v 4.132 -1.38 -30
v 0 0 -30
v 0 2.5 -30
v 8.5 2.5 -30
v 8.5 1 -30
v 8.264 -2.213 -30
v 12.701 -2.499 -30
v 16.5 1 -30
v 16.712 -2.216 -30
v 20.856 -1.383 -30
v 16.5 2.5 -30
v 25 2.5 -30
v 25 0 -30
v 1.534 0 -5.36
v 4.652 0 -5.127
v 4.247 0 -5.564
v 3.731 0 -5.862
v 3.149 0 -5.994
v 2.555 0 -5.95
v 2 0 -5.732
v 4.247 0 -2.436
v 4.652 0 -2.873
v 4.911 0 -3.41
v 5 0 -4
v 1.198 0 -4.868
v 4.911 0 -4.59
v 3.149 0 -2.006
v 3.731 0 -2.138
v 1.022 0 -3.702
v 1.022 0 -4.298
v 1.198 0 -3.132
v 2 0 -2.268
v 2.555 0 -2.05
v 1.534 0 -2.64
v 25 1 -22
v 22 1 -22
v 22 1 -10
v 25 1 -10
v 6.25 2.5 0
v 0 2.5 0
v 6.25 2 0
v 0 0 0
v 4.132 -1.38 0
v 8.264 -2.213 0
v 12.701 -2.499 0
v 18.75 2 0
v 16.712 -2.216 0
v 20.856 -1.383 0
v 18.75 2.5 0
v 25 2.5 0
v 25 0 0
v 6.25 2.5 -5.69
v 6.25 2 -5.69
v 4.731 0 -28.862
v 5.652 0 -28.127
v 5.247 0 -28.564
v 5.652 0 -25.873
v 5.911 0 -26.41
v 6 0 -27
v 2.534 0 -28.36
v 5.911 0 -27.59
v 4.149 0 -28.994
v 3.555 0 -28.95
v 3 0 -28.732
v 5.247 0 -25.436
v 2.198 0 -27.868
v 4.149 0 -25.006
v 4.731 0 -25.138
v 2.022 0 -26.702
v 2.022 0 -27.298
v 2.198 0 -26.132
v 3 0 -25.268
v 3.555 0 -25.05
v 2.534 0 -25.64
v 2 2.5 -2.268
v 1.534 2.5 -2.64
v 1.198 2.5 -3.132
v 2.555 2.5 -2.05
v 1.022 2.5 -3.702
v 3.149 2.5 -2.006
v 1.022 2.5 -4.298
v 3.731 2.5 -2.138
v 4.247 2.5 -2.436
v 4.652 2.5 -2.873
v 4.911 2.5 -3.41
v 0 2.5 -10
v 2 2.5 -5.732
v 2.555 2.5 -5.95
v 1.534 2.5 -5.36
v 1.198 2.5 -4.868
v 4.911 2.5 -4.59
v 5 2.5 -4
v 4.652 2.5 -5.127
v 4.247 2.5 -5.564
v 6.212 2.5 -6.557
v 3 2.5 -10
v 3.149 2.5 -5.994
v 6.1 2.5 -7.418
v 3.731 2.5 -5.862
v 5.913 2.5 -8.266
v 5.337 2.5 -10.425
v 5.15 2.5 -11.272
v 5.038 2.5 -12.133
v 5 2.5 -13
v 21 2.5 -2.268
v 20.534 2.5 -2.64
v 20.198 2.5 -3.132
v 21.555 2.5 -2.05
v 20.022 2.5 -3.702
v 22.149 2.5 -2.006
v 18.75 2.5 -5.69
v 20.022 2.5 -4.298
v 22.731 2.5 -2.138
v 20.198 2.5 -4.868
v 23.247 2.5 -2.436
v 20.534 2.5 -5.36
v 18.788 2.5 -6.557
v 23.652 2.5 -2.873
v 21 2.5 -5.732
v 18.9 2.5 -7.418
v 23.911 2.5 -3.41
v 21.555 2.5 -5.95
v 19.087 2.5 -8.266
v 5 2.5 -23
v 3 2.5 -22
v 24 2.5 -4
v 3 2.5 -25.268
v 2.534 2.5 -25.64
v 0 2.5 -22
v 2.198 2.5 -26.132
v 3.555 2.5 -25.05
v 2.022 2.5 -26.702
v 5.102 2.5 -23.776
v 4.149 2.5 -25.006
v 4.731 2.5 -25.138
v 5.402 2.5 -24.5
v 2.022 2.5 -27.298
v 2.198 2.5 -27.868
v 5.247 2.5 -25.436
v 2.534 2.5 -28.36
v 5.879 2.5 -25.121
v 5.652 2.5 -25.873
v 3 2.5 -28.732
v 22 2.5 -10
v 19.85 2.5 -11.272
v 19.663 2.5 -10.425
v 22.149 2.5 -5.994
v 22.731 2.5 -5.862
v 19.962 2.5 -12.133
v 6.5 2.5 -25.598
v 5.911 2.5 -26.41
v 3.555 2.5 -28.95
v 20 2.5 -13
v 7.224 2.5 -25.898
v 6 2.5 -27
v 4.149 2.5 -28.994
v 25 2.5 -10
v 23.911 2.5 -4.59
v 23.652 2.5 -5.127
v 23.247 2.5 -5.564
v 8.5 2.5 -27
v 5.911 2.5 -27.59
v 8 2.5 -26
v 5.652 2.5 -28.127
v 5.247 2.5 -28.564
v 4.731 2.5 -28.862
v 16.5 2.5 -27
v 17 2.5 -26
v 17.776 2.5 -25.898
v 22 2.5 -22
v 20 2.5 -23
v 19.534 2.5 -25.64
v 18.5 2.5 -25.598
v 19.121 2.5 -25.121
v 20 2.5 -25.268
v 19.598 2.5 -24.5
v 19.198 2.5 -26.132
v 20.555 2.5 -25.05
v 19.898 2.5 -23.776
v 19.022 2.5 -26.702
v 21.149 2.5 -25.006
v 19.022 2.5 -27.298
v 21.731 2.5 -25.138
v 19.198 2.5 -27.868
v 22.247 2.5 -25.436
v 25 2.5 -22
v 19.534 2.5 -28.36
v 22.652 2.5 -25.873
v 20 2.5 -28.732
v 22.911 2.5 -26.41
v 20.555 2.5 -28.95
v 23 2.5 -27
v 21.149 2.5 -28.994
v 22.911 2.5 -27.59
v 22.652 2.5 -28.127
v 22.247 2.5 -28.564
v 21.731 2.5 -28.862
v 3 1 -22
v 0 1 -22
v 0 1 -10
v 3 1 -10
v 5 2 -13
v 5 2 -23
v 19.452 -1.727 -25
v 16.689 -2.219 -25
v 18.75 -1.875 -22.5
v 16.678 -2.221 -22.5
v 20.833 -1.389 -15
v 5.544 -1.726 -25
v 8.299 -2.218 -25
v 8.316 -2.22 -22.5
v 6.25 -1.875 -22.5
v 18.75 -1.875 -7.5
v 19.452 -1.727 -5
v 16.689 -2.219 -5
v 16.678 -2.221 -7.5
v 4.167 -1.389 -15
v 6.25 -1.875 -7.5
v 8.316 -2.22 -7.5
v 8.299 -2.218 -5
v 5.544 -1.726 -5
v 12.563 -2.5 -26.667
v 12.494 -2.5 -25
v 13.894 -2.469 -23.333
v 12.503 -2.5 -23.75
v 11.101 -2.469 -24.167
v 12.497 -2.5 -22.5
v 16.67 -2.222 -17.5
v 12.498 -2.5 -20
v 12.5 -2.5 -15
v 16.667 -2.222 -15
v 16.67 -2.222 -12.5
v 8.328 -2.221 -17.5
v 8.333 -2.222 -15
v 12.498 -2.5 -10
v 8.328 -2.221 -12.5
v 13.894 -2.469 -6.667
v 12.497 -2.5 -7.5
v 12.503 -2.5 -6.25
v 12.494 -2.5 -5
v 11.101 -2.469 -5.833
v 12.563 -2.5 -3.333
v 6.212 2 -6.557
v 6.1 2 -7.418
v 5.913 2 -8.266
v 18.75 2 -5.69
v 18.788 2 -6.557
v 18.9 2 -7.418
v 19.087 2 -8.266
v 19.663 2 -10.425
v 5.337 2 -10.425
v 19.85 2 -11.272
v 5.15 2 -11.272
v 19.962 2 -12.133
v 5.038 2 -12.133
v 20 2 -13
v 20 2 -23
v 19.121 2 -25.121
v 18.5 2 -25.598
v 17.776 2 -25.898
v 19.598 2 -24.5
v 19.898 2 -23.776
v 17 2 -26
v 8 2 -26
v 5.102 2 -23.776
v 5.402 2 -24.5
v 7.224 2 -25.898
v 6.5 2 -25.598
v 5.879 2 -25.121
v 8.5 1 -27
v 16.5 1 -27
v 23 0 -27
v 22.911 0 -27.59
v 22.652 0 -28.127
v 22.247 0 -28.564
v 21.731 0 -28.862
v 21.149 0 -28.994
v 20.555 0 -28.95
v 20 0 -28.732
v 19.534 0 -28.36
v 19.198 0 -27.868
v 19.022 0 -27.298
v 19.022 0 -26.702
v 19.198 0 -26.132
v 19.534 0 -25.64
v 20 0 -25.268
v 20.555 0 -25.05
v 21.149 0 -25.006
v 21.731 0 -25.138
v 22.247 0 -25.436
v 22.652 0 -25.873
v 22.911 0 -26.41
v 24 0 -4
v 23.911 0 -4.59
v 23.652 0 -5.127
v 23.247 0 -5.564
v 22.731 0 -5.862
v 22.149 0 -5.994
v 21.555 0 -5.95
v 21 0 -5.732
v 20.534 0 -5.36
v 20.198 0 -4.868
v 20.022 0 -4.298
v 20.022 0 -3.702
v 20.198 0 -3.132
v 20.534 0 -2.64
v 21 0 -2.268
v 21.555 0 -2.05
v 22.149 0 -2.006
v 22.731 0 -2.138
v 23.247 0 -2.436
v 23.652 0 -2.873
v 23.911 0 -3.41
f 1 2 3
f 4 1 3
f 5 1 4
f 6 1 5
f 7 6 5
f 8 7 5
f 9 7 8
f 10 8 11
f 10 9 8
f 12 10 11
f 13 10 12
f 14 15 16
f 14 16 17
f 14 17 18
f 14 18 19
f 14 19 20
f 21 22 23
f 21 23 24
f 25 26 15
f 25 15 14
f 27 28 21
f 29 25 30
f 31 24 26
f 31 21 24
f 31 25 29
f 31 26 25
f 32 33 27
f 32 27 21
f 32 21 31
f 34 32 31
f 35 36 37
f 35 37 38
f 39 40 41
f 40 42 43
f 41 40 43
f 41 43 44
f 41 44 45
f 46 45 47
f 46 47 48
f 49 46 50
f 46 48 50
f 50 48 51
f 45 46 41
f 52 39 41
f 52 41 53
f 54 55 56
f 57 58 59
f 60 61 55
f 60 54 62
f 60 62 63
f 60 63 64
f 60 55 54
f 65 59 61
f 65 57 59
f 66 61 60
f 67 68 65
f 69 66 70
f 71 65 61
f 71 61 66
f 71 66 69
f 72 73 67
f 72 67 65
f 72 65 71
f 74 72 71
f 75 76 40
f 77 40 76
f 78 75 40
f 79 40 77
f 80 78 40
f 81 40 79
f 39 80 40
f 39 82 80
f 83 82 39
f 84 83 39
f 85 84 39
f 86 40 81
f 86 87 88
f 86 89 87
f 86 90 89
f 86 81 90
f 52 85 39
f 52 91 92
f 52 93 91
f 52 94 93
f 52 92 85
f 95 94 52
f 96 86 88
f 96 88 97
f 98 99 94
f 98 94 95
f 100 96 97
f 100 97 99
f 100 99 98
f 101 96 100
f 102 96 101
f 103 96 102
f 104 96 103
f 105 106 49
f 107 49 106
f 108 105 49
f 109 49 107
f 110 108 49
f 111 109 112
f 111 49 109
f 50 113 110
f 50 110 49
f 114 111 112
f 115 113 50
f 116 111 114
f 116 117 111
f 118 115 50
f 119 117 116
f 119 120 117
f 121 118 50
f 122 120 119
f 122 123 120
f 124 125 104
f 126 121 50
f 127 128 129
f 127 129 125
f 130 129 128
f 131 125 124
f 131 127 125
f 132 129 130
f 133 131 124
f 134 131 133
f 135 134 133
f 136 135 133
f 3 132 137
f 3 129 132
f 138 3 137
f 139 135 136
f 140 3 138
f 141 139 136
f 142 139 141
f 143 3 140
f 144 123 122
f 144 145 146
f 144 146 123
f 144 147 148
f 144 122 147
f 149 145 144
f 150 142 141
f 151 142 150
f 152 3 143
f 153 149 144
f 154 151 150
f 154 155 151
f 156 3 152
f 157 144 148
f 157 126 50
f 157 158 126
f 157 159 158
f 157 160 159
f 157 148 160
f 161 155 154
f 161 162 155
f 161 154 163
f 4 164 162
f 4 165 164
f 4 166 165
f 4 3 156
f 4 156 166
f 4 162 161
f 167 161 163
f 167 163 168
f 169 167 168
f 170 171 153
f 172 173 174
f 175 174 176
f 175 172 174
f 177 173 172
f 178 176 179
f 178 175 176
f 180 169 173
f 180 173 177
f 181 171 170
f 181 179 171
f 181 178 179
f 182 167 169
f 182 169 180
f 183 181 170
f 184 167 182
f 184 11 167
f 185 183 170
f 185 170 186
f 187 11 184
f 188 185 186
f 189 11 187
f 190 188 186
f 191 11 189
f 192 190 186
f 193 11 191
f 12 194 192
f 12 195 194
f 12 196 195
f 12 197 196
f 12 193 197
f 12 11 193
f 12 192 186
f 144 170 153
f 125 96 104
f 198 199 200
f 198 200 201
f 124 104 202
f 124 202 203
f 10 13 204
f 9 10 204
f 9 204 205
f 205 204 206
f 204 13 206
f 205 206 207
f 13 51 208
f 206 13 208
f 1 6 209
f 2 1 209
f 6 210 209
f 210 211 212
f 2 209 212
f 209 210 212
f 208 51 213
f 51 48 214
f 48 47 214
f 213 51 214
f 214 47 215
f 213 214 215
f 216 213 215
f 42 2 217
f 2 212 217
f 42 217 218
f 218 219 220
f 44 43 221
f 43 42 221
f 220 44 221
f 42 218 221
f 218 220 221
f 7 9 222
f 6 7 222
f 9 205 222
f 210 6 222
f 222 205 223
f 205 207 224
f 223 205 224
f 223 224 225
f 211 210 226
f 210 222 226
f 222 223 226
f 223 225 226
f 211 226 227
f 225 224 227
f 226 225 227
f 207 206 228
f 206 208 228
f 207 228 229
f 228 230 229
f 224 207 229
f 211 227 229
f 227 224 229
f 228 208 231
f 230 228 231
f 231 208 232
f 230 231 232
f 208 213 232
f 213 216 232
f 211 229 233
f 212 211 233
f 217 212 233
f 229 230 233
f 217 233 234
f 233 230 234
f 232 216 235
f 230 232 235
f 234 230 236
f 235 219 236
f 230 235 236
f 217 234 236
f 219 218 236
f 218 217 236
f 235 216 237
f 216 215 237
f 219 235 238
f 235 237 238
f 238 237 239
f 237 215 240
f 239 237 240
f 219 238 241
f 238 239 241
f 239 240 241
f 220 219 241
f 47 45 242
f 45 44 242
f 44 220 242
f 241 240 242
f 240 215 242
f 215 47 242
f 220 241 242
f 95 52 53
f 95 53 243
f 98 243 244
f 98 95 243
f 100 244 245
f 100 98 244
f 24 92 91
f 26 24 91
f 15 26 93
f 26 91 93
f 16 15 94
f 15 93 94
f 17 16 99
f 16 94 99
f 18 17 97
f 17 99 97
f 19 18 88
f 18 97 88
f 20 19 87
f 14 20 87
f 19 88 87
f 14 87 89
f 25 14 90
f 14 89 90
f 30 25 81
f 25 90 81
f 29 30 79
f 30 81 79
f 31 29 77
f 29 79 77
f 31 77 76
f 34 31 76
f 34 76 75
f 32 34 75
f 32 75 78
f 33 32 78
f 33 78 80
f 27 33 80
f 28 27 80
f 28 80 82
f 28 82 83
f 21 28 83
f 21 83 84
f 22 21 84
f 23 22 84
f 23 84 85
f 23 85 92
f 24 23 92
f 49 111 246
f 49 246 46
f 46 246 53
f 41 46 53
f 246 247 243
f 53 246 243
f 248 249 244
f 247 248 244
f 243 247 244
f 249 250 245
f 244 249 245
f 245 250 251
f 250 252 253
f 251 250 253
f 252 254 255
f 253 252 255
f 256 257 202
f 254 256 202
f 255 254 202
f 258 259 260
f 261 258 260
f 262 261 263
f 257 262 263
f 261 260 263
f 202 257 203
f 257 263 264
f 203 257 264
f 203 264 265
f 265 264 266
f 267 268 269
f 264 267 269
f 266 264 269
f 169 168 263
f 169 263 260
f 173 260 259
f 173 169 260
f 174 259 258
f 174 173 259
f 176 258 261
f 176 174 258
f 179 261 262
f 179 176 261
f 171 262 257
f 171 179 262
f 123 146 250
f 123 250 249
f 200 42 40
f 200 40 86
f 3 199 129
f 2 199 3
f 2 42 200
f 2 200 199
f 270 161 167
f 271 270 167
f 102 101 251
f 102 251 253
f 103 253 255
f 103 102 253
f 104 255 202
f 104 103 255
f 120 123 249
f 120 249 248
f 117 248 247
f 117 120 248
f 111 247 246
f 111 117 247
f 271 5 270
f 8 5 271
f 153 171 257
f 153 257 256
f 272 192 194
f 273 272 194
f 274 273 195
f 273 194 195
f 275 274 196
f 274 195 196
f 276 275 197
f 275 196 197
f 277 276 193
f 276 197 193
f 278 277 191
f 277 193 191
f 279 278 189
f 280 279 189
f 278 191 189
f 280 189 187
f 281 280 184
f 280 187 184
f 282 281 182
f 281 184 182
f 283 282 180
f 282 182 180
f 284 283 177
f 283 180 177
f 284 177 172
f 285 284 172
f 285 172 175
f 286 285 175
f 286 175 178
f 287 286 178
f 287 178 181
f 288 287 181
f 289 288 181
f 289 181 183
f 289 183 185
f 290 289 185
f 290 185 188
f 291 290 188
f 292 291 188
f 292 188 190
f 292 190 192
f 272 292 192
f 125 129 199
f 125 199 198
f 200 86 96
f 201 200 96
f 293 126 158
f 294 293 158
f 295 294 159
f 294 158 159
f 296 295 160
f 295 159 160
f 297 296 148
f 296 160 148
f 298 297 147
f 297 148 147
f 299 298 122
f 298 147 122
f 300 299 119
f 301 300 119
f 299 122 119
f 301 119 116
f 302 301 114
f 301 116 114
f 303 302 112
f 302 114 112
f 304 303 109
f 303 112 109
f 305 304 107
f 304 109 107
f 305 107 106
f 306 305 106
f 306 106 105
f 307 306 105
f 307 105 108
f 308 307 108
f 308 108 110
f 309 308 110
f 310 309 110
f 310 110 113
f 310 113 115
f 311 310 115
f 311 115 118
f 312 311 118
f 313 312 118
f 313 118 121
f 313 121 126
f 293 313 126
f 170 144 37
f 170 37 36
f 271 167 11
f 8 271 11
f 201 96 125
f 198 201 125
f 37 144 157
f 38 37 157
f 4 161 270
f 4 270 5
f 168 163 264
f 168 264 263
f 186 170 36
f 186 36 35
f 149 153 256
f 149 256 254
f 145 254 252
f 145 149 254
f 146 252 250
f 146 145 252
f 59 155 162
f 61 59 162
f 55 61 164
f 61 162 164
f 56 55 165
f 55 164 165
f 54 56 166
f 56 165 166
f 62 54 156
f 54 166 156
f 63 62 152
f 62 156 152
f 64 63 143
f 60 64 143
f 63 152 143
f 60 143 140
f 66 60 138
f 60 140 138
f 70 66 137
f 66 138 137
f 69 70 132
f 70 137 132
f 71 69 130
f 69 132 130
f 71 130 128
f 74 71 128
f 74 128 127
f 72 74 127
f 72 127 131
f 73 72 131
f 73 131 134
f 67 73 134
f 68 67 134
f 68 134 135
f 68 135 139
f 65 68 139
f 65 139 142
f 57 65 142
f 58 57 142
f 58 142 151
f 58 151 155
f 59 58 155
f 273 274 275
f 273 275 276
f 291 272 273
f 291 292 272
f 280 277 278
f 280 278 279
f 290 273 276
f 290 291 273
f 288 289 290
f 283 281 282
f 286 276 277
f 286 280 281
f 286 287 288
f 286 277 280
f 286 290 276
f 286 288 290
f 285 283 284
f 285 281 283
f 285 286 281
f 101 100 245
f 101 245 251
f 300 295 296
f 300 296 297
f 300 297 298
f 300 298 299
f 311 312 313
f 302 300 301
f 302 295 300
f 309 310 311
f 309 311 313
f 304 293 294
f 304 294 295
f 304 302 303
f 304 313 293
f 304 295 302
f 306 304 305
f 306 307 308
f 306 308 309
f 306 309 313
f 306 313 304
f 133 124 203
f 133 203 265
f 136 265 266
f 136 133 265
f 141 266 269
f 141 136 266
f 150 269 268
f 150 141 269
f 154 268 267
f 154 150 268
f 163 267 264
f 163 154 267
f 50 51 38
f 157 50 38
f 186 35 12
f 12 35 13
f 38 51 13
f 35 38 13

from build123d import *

# Parameters (mm, degrees)
SKETCH1_W           = 25
SKETCH1_H           = 30
BOSS_EXTRUDE1_DEPTH = 2.5
CUT_EXTRUDE1_DEPTH  = 0.5
SKETCH3_R           = 2
CUT_EXTRUDE2_DEPTH  = 3.5
BOSS_EXTRUDE2_DEPTH = 30
SKETCH5_W           = 8
SKETCH5_H           = 3
SKETCH5_W_2         = 3
SKETCH5_H_2         = 12
CUT_EXTRUDE3_DEPTH  = 1.5


with BuildPart() as part:
    # Sketch1 → Boss-Extrude1 (new body)
    with BuildSketch(Plane(origin=(0, 0, 0), x_dir=(1, 0, 0), z_dir=(0, 1, 0))):
        with Locations((12.5, 15)):
            Rectangle(SKETCH1_W, SKETCH1_H)
    extrude(amount=BOSS_EXTRUDE1_DEPTH)

    # Sketch2 → Cut-Extrude1 (cut)
    with BuildSketch(Plane(origin=(0, 2.5, 0), x_dir=(1, 0, 0), z_dir=(0, 1, 0))):
        with BuildLine():
            Line((8, 26), (17, 26))
            ThreePointArc((17, 26), (19.121320344, 25.121320344), (20, 23))
            Line((20, 23), (20, 13))
            ThreePointArc((20, 13), (19.915325472, 11.701415851), (19.662735842, 10.424823102))
            Line((19.662735842, 10.424823102), (19.087264158, 8.265503148))
            ThreePointArc((19.087264158, 8.265503148), (18.834674528, 6.988910399), (18.75, 5.690326251))
            Line((18.75, 5.690326251), (18.75, 0))
            Line((18.75, 0), (6.25, 0))
            Line((6.25, 0), (6.25, 5.690326251))
            ThreePointArc((6.25, 5.690326251), (6.165325472, 6.988910399), (5.912735842, 8.265503148))
            Line((5.912735842, 8.265503148), (5.337264158, 10.424823102))
            ThreePointArc((5.337264158, 10.424823102), (5.084674528, 11.701415851), (5, 13))
            Line((5, 13), (5, 23))
            ThreePointArc((5, 23), (5.878679656, 25.121320344), (8, 26))
        make_face()
    extrude(amount=-CUT_EXTRUDE1_DEPTH, mode=Mode.SUBTRACT)

    # Sketch3 → Cut-Extrude2 (cut)
    with BuildSketch(Plane(origin=(0, 2.5, 0), x_dir=(1, 0, 0), z_dir=(0, 1, 0))):
        with Locations((21, 27)):
            Circle(SKETCH3_R)
        with Locations((4, 27)):
            Circle(SKETCH3_R)
        with Locations((3, 4)):
            Circle(SKETCH3_R)
        with Locations((22, 4)):
            Circle(SKETCH3_R)
    extrude(amount=-CUT_EXTRUDE2_DEPTH, mode=Mode.SUBTRACT)

    # Sketch4 → Boss-Extrude2 (add)
    with BuildSketch(Plane.XY):
        with BuildLine():
            Line((25, 0), (0, 0))
            add(Edge.make_bspline(
                [(25, 0), (12.5, -5), (0, 0)],
                knots=[0, 0, 0, 1, 1, 1], degree=2))
        make_face()
    extrude(amount=-BOSS_EXTRUDE2_DEPTH)

    # Sketch5 → Cut-Extrude3 (cut)
    with BuildSketch(Plane(origin=(0, 2.5, 0), x_dir=(1, 0, 0), z_dir=(0, 1, 0))):
        with Locations((12.5, 28.5)):
            Rectangle(SKETCH5_W, SKETCH5_H)
        with Locations((23.5, 16)):
            Rectangle(SKETCH5_W_2, SKETCH5_H_2)
        with Locations((1.5, 16)):
            Rectangle(SKETCH5_W_2, SKETCH5_H_2)
    extrude(amount=-CUT_EXTRUDE3_DEPTH, mode=Mode.SUBTRACT)


solid = part.part
